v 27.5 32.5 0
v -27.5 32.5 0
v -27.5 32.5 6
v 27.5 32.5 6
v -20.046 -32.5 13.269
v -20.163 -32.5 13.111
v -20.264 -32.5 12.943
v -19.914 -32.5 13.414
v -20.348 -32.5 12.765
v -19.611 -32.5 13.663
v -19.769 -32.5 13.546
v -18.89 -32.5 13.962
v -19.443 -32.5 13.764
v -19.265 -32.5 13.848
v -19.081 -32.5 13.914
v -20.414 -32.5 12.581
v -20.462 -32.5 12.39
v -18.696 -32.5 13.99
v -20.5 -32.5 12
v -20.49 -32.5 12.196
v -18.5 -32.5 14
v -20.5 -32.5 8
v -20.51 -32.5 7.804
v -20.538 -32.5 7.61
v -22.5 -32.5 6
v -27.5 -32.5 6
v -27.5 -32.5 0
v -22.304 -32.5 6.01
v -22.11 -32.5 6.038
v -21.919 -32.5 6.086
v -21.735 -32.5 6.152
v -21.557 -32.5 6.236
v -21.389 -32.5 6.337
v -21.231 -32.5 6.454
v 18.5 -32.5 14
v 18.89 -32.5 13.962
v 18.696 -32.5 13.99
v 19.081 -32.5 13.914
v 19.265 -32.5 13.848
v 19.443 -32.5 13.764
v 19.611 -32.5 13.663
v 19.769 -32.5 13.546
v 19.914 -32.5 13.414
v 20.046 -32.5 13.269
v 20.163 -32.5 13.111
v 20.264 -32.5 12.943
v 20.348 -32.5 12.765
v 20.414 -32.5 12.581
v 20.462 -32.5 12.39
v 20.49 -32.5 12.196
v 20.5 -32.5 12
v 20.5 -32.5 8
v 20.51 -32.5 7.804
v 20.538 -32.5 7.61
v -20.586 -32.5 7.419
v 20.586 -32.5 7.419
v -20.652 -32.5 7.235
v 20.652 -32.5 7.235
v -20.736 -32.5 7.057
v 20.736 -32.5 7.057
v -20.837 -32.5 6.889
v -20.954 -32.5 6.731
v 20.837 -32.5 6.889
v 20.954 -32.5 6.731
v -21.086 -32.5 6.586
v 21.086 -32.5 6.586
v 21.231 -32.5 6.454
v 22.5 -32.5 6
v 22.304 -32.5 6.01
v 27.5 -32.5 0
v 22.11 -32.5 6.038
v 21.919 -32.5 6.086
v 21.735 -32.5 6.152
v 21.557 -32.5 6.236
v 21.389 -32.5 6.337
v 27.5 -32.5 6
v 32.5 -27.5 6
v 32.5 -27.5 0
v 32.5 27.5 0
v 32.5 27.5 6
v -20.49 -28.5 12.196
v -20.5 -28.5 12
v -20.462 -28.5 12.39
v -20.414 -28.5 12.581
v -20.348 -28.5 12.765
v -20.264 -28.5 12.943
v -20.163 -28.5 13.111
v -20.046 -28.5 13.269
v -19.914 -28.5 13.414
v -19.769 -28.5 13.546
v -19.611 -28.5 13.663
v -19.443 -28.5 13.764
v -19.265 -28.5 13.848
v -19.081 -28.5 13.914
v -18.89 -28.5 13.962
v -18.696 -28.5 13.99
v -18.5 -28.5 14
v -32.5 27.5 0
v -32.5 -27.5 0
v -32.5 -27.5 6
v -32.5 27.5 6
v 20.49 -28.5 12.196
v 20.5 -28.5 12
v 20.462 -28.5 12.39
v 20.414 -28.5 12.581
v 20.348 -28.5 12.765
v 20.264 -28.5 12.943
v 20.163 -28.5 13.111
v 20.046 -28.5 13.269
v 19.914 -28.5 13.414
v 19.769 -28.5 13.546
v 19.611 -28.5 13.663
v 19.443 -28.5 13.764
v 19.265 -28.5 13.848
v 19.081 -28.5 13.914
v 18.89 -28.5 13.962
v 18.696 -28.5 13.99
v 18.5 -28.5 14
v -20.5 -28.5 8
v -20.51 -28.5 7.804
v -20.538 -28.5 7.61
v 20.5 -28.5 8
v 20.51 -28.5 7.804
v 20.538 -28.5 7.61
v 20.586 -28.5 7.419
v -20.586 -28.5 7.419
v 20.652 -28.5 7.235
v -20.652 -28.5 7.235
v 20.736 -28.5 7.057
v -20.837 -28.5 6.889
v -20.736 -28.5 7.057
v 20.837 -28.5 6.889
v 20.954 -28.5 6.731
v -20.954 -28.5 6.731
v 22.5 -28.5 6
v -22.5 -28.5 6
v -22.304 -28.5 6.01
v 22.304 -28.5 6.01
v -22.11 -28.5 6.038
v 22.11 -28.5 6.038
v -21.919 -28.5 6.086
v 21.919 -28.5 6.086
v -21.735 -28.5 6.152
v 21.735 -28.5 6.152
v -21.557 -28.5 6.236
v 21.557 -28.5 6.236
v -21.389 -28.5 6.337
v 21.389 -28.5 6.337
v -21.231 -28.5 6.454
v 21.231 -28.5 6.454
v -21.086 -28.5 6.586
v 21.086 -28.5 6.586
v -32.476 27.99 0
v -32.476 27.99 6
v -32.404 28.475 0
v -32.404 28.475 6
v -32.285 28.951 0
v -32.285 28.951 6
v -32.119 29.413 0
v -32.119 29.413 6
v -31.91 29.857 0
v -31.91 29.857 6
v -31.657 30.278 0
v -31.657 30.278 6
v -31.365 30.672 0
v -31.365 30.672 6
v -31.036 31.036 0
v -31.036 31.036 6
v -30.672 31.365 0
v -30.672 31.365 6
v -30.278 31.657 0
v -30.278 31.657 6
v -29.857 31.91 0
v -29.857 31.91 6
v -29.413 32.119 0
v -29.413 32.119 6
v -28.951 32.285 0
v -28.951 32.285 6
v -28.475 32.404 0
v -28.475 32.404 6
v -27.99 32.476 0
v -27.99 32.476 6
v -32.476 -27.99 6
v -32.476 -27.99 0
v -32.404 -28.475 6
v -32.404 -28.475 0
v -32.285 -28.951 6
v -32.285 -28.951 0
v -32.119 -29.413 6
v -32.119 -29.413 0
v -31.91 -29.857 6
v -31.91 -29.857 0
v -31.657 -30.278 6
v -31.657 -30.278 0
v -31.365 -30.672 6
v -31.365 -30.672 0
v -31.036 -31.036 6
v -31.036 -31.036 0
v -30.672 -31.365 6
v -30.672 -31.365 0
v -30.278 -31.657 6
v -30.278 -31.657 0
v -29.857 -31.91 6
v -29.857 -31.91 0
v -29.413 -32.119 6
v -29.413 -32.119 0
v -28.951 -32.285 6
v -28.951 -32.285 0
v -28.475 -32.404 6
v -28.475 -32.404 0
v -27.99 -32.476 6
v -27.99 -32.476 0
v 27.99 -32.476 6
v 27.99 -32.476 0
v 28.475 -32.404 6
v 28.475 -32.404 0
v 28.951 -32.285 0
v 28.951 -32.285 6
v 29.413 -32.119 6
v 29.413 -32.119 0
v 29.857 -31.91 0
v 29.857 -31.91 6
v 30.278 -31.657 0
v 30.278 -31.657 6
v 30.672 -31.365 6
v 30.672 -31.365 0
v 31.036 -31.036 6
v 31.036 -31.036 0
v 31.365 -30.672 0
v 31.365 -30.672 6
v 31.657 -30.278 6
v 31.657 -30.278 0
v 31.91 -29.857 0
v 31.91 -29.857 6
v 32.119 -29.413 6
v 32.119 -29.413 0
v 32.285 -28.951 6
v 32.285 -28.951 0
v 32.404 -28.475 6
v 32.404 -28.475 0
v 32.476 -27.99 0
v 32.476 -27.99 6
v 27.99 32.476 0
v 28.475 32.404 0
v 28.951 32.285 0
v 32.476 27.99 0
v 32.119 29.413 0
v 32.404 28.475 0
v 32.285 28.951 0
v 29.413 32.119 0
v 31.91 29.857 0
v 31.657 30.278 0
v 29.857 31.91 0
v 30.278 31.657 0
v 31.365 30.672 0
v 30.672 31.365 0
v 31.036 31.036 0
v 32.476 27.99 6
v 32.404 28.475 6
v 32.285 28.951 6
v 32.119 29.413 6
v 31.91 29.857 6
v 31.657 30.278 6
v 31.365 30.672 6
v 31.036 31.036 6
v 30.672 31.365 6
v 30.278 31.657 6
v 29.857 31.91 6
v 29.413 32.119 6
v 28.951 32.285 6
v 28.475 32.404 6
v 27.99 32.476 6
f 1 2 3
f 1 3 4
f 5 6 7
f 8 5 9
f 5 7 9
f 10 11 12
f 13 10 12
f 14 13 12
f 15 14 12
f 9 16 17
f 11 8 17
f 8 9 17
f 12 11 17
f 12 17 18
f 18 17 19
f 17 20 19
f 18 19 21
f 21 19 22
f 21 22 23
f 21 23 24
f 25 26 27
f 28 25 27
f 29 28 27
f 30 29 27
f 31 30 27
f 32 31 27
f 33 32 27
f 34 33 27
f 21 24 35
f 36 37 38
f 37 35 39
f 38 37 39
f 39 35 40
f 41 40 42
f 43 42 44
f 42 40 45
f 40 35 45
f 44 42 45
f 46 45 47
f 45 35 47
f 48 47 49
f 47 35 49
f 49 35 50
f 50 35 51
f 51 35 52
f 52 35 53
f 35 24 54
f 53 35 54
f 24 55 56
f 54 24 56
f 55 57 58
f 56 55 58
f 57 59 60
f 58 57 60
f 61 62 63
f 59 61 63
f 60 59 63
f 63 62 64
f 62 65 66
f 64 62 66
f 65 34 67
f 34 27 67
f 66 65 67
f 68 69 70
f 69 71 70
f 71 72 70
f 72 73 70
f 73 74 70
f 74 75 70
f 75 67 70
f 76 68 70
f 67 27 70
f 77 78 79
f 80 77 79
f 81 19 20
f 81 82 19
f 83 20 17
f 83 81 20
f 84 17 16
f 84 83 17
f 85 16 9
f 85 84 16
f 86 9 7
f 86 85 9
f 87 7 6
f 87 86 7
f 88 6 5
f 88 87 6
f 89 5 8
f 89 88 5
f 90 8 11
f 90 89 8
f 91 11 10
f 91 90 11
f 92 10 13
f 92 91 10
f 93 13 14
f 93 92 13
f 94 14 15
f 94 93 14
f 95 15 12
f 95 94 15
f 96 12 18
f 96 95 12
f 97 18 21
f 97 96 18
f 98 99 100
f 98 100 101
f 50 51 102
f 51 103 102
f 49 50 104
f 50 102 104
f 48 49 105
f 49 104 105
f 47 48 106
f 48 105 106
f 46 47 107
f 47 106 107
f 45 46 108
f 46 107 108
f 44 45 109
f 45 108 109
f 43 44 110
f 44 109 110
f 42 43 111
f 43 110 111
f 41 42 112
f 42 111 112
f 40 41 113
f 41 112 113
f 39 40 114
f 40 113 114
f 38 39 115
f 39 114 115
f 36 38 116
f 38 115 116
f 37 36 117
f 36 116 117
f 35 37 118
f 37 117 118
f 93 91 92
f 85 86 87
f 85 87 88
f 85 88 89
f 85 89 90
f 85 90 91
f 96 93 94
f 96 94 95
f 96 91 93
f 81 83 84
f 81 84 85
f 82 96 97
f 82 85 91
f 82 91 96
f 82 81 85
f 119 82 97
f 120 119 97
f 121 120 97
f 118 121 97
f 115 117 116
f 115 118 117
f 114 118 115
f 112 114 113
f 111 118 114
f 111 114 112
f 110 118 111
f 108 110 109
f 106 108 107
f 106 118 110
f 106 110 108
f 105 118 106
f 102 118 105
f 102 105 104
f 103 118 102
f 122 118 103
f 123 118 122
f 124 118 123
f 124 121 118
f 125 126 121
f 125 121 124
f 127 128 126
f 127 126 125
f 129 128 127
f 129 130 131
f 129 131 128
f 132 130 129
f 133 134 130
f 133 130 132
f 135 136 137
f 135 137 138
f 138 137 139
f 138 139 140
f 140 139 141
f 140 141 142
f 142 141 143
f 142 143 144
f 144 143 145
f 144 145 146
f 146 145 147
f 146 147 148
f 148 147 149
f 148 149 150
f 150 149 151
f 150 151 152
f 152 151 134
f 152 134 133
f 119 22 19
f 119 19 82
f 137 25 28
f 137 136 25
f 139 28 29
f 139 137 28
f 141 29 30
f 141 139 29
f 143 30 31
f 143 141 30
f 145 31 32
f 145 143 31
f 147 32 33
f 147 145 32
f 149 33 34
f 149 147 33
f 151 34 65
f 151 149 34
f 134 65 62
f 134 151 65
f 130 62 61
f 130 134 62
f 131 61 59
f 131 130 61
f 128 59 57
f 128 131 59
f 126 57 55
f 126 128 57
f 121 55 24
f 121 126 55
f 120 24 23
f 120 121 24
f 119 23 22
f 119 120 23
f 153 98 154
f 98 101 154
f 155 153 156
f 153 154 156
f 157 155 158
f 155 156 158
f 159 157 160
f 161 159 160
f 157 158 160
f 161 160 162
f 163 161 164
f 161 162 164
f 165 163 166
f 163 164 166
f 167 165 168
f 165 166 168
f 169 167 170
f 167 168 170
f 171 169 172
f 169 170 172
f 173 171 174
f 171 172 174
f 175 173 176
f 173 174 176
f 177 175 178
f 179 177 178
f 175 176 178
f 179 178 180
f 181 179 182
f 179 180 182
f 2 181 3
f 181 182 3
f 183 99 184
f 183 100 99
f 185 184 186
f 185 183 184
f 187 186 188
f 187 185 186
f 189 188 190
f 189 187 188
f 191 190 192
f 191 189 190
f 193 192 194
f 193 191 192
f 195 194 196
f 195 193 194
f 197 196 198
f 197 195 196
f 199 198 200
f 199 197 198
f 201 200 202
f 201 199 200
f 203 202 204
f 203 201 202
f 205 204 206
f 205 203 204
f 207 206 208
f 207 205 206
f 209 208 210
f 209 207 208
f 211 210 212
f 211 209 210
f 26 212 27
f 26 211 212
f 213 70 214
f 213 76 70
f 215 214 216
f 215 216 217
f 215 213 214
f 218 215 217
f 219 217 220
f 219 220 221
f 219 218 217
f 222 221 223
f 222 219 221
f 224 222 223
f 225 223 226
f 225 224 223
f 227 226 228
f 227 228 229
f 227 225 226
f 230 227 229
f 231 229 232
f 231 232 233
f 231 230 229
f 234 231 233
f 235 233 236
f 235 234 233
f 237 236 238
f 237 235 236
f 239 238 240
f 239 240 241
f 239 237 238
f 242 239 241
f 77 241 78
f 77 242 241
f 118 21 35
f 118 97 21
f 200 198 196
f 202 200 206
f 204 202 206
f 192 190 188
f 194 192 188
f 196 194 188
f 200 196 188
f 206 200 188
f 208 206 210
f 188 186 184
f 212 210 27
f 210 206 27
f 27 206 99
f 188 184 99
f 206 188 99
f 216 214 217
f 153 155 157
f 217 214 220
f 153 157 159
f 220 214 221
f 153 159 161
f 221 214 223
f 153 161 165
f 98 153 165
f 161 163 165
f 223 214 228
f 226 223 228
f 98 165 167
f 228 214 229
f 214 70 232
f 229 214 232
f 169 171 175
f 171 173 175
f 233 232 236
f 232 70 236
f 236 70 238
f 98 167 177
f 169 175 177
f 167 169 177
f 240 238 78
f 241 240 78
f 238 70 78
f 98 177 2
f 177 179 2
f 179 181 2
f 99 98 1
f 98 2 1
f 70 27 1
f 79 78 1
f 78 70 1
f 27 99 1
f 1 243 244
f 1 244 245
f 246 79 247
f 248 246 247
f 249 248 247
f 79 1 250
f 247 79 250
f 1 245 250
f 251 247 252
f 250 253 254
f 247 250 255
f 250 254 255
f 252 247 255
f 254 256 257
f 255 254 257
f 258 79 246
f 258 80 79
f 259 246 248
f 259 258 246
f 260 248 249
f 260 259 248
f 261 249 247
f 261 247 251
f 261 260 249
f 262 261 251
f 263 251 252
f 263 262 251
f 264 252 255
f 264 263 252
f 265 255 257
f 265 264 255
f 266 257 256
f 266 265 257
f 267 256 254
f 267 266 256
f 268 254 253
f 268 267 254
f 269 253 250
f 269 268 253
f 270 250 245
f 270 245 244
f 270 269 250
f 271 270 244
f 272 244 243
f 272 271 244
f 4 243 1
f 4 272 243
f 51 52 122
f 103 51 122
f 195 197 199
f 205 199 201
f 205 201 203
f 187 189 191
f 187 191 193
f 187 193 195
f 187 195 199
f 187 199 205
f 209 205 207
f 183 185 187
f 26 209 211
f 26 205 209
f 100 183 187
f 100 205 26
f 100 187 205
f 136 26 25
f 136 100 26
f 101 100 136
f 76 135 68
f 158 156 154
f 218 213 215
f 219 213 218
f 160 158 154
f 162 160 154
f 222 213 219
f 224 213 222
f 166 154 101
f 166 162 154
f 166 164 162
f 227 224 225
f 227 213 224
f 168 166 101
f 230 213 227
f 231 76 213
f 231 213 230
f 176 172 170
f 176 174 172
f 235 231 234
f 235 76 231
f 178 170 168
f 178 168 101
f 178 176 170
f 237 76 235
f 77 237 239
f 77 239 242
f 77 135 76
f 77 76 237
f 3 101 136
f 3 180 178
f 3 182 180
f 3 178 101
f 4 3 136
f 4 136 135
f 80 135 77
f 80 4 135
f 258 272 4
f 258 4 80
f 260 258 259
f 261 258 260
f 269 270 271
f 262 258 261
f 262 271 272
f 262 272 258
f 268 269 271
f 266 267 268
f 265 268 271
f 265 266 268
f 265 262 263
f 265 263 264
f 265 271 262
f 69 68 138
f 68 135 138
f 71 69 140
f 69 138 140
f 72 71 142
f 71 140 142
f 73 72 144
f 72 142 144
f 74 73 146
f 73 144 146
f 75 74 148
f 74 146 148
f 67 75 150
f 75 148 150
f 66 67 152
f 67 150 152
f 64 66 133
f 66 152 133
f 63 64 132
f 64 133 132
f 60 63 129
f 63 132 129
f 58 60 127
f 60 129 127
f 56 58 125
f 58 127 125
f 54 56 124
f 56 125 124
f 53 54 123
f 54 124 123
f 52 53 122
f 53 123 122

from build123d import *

# Parameters (mm, degrees)
SKETCH1_W           = 65
SKETCH1_H           = 65
BOSS_EXTRUDE1_DEPTH = 6
FILLET1_R           = 5
SKETCH2_W           = 41
SKETCH2_H           = 4
BOSS_EXTRUDE2_DEPTH = 8
FILLET2_R           = 2


with BuildPart() as part:
    # Sketch1 → Boss-Extrude1 (new body)
    with BuildSketch(Plane.XY):
        Rectangle(SKETCH1_W, SKETCH1_H)
    extrude(amount=BOSS_EXTRUDE1_DEPTH)

    # Fillet1
    fillet1_edges = [part.edges().sort_by_distance(p)[0] for p in [
        (32.5, -32.5, 3),
        (-32.5, -32.5, 3),
        (-32.5, 32.5, 3),
        (32.5, 32.5, 3),
    ]]
    fillet(fillet1_edges, radius=FILLET1_R)

    # Sketch2 → Boss-Extrude2 (add)
    with BuildSketch(Plane.XY.offset(6)):
        with Locations((0, -30.5)):
            Rectangle(SKETCH2_W, SKETCH2_H)
    extrude(amount=BOSS_EXTRUDE2_DEPTH)

    # Fillet2
    fillet2_edges = [part.edges().sort_by_distance(p)[0] for p in [
        (-20.5, -30.5, 6),
        (20.5, -30.5, 6),
        (-20.5, -30.5, 14),
        (20.5, -30.5, 14),
    ]]
    fillet(fillet2_edges, radius=FILLET2_R)


solid = part.part
